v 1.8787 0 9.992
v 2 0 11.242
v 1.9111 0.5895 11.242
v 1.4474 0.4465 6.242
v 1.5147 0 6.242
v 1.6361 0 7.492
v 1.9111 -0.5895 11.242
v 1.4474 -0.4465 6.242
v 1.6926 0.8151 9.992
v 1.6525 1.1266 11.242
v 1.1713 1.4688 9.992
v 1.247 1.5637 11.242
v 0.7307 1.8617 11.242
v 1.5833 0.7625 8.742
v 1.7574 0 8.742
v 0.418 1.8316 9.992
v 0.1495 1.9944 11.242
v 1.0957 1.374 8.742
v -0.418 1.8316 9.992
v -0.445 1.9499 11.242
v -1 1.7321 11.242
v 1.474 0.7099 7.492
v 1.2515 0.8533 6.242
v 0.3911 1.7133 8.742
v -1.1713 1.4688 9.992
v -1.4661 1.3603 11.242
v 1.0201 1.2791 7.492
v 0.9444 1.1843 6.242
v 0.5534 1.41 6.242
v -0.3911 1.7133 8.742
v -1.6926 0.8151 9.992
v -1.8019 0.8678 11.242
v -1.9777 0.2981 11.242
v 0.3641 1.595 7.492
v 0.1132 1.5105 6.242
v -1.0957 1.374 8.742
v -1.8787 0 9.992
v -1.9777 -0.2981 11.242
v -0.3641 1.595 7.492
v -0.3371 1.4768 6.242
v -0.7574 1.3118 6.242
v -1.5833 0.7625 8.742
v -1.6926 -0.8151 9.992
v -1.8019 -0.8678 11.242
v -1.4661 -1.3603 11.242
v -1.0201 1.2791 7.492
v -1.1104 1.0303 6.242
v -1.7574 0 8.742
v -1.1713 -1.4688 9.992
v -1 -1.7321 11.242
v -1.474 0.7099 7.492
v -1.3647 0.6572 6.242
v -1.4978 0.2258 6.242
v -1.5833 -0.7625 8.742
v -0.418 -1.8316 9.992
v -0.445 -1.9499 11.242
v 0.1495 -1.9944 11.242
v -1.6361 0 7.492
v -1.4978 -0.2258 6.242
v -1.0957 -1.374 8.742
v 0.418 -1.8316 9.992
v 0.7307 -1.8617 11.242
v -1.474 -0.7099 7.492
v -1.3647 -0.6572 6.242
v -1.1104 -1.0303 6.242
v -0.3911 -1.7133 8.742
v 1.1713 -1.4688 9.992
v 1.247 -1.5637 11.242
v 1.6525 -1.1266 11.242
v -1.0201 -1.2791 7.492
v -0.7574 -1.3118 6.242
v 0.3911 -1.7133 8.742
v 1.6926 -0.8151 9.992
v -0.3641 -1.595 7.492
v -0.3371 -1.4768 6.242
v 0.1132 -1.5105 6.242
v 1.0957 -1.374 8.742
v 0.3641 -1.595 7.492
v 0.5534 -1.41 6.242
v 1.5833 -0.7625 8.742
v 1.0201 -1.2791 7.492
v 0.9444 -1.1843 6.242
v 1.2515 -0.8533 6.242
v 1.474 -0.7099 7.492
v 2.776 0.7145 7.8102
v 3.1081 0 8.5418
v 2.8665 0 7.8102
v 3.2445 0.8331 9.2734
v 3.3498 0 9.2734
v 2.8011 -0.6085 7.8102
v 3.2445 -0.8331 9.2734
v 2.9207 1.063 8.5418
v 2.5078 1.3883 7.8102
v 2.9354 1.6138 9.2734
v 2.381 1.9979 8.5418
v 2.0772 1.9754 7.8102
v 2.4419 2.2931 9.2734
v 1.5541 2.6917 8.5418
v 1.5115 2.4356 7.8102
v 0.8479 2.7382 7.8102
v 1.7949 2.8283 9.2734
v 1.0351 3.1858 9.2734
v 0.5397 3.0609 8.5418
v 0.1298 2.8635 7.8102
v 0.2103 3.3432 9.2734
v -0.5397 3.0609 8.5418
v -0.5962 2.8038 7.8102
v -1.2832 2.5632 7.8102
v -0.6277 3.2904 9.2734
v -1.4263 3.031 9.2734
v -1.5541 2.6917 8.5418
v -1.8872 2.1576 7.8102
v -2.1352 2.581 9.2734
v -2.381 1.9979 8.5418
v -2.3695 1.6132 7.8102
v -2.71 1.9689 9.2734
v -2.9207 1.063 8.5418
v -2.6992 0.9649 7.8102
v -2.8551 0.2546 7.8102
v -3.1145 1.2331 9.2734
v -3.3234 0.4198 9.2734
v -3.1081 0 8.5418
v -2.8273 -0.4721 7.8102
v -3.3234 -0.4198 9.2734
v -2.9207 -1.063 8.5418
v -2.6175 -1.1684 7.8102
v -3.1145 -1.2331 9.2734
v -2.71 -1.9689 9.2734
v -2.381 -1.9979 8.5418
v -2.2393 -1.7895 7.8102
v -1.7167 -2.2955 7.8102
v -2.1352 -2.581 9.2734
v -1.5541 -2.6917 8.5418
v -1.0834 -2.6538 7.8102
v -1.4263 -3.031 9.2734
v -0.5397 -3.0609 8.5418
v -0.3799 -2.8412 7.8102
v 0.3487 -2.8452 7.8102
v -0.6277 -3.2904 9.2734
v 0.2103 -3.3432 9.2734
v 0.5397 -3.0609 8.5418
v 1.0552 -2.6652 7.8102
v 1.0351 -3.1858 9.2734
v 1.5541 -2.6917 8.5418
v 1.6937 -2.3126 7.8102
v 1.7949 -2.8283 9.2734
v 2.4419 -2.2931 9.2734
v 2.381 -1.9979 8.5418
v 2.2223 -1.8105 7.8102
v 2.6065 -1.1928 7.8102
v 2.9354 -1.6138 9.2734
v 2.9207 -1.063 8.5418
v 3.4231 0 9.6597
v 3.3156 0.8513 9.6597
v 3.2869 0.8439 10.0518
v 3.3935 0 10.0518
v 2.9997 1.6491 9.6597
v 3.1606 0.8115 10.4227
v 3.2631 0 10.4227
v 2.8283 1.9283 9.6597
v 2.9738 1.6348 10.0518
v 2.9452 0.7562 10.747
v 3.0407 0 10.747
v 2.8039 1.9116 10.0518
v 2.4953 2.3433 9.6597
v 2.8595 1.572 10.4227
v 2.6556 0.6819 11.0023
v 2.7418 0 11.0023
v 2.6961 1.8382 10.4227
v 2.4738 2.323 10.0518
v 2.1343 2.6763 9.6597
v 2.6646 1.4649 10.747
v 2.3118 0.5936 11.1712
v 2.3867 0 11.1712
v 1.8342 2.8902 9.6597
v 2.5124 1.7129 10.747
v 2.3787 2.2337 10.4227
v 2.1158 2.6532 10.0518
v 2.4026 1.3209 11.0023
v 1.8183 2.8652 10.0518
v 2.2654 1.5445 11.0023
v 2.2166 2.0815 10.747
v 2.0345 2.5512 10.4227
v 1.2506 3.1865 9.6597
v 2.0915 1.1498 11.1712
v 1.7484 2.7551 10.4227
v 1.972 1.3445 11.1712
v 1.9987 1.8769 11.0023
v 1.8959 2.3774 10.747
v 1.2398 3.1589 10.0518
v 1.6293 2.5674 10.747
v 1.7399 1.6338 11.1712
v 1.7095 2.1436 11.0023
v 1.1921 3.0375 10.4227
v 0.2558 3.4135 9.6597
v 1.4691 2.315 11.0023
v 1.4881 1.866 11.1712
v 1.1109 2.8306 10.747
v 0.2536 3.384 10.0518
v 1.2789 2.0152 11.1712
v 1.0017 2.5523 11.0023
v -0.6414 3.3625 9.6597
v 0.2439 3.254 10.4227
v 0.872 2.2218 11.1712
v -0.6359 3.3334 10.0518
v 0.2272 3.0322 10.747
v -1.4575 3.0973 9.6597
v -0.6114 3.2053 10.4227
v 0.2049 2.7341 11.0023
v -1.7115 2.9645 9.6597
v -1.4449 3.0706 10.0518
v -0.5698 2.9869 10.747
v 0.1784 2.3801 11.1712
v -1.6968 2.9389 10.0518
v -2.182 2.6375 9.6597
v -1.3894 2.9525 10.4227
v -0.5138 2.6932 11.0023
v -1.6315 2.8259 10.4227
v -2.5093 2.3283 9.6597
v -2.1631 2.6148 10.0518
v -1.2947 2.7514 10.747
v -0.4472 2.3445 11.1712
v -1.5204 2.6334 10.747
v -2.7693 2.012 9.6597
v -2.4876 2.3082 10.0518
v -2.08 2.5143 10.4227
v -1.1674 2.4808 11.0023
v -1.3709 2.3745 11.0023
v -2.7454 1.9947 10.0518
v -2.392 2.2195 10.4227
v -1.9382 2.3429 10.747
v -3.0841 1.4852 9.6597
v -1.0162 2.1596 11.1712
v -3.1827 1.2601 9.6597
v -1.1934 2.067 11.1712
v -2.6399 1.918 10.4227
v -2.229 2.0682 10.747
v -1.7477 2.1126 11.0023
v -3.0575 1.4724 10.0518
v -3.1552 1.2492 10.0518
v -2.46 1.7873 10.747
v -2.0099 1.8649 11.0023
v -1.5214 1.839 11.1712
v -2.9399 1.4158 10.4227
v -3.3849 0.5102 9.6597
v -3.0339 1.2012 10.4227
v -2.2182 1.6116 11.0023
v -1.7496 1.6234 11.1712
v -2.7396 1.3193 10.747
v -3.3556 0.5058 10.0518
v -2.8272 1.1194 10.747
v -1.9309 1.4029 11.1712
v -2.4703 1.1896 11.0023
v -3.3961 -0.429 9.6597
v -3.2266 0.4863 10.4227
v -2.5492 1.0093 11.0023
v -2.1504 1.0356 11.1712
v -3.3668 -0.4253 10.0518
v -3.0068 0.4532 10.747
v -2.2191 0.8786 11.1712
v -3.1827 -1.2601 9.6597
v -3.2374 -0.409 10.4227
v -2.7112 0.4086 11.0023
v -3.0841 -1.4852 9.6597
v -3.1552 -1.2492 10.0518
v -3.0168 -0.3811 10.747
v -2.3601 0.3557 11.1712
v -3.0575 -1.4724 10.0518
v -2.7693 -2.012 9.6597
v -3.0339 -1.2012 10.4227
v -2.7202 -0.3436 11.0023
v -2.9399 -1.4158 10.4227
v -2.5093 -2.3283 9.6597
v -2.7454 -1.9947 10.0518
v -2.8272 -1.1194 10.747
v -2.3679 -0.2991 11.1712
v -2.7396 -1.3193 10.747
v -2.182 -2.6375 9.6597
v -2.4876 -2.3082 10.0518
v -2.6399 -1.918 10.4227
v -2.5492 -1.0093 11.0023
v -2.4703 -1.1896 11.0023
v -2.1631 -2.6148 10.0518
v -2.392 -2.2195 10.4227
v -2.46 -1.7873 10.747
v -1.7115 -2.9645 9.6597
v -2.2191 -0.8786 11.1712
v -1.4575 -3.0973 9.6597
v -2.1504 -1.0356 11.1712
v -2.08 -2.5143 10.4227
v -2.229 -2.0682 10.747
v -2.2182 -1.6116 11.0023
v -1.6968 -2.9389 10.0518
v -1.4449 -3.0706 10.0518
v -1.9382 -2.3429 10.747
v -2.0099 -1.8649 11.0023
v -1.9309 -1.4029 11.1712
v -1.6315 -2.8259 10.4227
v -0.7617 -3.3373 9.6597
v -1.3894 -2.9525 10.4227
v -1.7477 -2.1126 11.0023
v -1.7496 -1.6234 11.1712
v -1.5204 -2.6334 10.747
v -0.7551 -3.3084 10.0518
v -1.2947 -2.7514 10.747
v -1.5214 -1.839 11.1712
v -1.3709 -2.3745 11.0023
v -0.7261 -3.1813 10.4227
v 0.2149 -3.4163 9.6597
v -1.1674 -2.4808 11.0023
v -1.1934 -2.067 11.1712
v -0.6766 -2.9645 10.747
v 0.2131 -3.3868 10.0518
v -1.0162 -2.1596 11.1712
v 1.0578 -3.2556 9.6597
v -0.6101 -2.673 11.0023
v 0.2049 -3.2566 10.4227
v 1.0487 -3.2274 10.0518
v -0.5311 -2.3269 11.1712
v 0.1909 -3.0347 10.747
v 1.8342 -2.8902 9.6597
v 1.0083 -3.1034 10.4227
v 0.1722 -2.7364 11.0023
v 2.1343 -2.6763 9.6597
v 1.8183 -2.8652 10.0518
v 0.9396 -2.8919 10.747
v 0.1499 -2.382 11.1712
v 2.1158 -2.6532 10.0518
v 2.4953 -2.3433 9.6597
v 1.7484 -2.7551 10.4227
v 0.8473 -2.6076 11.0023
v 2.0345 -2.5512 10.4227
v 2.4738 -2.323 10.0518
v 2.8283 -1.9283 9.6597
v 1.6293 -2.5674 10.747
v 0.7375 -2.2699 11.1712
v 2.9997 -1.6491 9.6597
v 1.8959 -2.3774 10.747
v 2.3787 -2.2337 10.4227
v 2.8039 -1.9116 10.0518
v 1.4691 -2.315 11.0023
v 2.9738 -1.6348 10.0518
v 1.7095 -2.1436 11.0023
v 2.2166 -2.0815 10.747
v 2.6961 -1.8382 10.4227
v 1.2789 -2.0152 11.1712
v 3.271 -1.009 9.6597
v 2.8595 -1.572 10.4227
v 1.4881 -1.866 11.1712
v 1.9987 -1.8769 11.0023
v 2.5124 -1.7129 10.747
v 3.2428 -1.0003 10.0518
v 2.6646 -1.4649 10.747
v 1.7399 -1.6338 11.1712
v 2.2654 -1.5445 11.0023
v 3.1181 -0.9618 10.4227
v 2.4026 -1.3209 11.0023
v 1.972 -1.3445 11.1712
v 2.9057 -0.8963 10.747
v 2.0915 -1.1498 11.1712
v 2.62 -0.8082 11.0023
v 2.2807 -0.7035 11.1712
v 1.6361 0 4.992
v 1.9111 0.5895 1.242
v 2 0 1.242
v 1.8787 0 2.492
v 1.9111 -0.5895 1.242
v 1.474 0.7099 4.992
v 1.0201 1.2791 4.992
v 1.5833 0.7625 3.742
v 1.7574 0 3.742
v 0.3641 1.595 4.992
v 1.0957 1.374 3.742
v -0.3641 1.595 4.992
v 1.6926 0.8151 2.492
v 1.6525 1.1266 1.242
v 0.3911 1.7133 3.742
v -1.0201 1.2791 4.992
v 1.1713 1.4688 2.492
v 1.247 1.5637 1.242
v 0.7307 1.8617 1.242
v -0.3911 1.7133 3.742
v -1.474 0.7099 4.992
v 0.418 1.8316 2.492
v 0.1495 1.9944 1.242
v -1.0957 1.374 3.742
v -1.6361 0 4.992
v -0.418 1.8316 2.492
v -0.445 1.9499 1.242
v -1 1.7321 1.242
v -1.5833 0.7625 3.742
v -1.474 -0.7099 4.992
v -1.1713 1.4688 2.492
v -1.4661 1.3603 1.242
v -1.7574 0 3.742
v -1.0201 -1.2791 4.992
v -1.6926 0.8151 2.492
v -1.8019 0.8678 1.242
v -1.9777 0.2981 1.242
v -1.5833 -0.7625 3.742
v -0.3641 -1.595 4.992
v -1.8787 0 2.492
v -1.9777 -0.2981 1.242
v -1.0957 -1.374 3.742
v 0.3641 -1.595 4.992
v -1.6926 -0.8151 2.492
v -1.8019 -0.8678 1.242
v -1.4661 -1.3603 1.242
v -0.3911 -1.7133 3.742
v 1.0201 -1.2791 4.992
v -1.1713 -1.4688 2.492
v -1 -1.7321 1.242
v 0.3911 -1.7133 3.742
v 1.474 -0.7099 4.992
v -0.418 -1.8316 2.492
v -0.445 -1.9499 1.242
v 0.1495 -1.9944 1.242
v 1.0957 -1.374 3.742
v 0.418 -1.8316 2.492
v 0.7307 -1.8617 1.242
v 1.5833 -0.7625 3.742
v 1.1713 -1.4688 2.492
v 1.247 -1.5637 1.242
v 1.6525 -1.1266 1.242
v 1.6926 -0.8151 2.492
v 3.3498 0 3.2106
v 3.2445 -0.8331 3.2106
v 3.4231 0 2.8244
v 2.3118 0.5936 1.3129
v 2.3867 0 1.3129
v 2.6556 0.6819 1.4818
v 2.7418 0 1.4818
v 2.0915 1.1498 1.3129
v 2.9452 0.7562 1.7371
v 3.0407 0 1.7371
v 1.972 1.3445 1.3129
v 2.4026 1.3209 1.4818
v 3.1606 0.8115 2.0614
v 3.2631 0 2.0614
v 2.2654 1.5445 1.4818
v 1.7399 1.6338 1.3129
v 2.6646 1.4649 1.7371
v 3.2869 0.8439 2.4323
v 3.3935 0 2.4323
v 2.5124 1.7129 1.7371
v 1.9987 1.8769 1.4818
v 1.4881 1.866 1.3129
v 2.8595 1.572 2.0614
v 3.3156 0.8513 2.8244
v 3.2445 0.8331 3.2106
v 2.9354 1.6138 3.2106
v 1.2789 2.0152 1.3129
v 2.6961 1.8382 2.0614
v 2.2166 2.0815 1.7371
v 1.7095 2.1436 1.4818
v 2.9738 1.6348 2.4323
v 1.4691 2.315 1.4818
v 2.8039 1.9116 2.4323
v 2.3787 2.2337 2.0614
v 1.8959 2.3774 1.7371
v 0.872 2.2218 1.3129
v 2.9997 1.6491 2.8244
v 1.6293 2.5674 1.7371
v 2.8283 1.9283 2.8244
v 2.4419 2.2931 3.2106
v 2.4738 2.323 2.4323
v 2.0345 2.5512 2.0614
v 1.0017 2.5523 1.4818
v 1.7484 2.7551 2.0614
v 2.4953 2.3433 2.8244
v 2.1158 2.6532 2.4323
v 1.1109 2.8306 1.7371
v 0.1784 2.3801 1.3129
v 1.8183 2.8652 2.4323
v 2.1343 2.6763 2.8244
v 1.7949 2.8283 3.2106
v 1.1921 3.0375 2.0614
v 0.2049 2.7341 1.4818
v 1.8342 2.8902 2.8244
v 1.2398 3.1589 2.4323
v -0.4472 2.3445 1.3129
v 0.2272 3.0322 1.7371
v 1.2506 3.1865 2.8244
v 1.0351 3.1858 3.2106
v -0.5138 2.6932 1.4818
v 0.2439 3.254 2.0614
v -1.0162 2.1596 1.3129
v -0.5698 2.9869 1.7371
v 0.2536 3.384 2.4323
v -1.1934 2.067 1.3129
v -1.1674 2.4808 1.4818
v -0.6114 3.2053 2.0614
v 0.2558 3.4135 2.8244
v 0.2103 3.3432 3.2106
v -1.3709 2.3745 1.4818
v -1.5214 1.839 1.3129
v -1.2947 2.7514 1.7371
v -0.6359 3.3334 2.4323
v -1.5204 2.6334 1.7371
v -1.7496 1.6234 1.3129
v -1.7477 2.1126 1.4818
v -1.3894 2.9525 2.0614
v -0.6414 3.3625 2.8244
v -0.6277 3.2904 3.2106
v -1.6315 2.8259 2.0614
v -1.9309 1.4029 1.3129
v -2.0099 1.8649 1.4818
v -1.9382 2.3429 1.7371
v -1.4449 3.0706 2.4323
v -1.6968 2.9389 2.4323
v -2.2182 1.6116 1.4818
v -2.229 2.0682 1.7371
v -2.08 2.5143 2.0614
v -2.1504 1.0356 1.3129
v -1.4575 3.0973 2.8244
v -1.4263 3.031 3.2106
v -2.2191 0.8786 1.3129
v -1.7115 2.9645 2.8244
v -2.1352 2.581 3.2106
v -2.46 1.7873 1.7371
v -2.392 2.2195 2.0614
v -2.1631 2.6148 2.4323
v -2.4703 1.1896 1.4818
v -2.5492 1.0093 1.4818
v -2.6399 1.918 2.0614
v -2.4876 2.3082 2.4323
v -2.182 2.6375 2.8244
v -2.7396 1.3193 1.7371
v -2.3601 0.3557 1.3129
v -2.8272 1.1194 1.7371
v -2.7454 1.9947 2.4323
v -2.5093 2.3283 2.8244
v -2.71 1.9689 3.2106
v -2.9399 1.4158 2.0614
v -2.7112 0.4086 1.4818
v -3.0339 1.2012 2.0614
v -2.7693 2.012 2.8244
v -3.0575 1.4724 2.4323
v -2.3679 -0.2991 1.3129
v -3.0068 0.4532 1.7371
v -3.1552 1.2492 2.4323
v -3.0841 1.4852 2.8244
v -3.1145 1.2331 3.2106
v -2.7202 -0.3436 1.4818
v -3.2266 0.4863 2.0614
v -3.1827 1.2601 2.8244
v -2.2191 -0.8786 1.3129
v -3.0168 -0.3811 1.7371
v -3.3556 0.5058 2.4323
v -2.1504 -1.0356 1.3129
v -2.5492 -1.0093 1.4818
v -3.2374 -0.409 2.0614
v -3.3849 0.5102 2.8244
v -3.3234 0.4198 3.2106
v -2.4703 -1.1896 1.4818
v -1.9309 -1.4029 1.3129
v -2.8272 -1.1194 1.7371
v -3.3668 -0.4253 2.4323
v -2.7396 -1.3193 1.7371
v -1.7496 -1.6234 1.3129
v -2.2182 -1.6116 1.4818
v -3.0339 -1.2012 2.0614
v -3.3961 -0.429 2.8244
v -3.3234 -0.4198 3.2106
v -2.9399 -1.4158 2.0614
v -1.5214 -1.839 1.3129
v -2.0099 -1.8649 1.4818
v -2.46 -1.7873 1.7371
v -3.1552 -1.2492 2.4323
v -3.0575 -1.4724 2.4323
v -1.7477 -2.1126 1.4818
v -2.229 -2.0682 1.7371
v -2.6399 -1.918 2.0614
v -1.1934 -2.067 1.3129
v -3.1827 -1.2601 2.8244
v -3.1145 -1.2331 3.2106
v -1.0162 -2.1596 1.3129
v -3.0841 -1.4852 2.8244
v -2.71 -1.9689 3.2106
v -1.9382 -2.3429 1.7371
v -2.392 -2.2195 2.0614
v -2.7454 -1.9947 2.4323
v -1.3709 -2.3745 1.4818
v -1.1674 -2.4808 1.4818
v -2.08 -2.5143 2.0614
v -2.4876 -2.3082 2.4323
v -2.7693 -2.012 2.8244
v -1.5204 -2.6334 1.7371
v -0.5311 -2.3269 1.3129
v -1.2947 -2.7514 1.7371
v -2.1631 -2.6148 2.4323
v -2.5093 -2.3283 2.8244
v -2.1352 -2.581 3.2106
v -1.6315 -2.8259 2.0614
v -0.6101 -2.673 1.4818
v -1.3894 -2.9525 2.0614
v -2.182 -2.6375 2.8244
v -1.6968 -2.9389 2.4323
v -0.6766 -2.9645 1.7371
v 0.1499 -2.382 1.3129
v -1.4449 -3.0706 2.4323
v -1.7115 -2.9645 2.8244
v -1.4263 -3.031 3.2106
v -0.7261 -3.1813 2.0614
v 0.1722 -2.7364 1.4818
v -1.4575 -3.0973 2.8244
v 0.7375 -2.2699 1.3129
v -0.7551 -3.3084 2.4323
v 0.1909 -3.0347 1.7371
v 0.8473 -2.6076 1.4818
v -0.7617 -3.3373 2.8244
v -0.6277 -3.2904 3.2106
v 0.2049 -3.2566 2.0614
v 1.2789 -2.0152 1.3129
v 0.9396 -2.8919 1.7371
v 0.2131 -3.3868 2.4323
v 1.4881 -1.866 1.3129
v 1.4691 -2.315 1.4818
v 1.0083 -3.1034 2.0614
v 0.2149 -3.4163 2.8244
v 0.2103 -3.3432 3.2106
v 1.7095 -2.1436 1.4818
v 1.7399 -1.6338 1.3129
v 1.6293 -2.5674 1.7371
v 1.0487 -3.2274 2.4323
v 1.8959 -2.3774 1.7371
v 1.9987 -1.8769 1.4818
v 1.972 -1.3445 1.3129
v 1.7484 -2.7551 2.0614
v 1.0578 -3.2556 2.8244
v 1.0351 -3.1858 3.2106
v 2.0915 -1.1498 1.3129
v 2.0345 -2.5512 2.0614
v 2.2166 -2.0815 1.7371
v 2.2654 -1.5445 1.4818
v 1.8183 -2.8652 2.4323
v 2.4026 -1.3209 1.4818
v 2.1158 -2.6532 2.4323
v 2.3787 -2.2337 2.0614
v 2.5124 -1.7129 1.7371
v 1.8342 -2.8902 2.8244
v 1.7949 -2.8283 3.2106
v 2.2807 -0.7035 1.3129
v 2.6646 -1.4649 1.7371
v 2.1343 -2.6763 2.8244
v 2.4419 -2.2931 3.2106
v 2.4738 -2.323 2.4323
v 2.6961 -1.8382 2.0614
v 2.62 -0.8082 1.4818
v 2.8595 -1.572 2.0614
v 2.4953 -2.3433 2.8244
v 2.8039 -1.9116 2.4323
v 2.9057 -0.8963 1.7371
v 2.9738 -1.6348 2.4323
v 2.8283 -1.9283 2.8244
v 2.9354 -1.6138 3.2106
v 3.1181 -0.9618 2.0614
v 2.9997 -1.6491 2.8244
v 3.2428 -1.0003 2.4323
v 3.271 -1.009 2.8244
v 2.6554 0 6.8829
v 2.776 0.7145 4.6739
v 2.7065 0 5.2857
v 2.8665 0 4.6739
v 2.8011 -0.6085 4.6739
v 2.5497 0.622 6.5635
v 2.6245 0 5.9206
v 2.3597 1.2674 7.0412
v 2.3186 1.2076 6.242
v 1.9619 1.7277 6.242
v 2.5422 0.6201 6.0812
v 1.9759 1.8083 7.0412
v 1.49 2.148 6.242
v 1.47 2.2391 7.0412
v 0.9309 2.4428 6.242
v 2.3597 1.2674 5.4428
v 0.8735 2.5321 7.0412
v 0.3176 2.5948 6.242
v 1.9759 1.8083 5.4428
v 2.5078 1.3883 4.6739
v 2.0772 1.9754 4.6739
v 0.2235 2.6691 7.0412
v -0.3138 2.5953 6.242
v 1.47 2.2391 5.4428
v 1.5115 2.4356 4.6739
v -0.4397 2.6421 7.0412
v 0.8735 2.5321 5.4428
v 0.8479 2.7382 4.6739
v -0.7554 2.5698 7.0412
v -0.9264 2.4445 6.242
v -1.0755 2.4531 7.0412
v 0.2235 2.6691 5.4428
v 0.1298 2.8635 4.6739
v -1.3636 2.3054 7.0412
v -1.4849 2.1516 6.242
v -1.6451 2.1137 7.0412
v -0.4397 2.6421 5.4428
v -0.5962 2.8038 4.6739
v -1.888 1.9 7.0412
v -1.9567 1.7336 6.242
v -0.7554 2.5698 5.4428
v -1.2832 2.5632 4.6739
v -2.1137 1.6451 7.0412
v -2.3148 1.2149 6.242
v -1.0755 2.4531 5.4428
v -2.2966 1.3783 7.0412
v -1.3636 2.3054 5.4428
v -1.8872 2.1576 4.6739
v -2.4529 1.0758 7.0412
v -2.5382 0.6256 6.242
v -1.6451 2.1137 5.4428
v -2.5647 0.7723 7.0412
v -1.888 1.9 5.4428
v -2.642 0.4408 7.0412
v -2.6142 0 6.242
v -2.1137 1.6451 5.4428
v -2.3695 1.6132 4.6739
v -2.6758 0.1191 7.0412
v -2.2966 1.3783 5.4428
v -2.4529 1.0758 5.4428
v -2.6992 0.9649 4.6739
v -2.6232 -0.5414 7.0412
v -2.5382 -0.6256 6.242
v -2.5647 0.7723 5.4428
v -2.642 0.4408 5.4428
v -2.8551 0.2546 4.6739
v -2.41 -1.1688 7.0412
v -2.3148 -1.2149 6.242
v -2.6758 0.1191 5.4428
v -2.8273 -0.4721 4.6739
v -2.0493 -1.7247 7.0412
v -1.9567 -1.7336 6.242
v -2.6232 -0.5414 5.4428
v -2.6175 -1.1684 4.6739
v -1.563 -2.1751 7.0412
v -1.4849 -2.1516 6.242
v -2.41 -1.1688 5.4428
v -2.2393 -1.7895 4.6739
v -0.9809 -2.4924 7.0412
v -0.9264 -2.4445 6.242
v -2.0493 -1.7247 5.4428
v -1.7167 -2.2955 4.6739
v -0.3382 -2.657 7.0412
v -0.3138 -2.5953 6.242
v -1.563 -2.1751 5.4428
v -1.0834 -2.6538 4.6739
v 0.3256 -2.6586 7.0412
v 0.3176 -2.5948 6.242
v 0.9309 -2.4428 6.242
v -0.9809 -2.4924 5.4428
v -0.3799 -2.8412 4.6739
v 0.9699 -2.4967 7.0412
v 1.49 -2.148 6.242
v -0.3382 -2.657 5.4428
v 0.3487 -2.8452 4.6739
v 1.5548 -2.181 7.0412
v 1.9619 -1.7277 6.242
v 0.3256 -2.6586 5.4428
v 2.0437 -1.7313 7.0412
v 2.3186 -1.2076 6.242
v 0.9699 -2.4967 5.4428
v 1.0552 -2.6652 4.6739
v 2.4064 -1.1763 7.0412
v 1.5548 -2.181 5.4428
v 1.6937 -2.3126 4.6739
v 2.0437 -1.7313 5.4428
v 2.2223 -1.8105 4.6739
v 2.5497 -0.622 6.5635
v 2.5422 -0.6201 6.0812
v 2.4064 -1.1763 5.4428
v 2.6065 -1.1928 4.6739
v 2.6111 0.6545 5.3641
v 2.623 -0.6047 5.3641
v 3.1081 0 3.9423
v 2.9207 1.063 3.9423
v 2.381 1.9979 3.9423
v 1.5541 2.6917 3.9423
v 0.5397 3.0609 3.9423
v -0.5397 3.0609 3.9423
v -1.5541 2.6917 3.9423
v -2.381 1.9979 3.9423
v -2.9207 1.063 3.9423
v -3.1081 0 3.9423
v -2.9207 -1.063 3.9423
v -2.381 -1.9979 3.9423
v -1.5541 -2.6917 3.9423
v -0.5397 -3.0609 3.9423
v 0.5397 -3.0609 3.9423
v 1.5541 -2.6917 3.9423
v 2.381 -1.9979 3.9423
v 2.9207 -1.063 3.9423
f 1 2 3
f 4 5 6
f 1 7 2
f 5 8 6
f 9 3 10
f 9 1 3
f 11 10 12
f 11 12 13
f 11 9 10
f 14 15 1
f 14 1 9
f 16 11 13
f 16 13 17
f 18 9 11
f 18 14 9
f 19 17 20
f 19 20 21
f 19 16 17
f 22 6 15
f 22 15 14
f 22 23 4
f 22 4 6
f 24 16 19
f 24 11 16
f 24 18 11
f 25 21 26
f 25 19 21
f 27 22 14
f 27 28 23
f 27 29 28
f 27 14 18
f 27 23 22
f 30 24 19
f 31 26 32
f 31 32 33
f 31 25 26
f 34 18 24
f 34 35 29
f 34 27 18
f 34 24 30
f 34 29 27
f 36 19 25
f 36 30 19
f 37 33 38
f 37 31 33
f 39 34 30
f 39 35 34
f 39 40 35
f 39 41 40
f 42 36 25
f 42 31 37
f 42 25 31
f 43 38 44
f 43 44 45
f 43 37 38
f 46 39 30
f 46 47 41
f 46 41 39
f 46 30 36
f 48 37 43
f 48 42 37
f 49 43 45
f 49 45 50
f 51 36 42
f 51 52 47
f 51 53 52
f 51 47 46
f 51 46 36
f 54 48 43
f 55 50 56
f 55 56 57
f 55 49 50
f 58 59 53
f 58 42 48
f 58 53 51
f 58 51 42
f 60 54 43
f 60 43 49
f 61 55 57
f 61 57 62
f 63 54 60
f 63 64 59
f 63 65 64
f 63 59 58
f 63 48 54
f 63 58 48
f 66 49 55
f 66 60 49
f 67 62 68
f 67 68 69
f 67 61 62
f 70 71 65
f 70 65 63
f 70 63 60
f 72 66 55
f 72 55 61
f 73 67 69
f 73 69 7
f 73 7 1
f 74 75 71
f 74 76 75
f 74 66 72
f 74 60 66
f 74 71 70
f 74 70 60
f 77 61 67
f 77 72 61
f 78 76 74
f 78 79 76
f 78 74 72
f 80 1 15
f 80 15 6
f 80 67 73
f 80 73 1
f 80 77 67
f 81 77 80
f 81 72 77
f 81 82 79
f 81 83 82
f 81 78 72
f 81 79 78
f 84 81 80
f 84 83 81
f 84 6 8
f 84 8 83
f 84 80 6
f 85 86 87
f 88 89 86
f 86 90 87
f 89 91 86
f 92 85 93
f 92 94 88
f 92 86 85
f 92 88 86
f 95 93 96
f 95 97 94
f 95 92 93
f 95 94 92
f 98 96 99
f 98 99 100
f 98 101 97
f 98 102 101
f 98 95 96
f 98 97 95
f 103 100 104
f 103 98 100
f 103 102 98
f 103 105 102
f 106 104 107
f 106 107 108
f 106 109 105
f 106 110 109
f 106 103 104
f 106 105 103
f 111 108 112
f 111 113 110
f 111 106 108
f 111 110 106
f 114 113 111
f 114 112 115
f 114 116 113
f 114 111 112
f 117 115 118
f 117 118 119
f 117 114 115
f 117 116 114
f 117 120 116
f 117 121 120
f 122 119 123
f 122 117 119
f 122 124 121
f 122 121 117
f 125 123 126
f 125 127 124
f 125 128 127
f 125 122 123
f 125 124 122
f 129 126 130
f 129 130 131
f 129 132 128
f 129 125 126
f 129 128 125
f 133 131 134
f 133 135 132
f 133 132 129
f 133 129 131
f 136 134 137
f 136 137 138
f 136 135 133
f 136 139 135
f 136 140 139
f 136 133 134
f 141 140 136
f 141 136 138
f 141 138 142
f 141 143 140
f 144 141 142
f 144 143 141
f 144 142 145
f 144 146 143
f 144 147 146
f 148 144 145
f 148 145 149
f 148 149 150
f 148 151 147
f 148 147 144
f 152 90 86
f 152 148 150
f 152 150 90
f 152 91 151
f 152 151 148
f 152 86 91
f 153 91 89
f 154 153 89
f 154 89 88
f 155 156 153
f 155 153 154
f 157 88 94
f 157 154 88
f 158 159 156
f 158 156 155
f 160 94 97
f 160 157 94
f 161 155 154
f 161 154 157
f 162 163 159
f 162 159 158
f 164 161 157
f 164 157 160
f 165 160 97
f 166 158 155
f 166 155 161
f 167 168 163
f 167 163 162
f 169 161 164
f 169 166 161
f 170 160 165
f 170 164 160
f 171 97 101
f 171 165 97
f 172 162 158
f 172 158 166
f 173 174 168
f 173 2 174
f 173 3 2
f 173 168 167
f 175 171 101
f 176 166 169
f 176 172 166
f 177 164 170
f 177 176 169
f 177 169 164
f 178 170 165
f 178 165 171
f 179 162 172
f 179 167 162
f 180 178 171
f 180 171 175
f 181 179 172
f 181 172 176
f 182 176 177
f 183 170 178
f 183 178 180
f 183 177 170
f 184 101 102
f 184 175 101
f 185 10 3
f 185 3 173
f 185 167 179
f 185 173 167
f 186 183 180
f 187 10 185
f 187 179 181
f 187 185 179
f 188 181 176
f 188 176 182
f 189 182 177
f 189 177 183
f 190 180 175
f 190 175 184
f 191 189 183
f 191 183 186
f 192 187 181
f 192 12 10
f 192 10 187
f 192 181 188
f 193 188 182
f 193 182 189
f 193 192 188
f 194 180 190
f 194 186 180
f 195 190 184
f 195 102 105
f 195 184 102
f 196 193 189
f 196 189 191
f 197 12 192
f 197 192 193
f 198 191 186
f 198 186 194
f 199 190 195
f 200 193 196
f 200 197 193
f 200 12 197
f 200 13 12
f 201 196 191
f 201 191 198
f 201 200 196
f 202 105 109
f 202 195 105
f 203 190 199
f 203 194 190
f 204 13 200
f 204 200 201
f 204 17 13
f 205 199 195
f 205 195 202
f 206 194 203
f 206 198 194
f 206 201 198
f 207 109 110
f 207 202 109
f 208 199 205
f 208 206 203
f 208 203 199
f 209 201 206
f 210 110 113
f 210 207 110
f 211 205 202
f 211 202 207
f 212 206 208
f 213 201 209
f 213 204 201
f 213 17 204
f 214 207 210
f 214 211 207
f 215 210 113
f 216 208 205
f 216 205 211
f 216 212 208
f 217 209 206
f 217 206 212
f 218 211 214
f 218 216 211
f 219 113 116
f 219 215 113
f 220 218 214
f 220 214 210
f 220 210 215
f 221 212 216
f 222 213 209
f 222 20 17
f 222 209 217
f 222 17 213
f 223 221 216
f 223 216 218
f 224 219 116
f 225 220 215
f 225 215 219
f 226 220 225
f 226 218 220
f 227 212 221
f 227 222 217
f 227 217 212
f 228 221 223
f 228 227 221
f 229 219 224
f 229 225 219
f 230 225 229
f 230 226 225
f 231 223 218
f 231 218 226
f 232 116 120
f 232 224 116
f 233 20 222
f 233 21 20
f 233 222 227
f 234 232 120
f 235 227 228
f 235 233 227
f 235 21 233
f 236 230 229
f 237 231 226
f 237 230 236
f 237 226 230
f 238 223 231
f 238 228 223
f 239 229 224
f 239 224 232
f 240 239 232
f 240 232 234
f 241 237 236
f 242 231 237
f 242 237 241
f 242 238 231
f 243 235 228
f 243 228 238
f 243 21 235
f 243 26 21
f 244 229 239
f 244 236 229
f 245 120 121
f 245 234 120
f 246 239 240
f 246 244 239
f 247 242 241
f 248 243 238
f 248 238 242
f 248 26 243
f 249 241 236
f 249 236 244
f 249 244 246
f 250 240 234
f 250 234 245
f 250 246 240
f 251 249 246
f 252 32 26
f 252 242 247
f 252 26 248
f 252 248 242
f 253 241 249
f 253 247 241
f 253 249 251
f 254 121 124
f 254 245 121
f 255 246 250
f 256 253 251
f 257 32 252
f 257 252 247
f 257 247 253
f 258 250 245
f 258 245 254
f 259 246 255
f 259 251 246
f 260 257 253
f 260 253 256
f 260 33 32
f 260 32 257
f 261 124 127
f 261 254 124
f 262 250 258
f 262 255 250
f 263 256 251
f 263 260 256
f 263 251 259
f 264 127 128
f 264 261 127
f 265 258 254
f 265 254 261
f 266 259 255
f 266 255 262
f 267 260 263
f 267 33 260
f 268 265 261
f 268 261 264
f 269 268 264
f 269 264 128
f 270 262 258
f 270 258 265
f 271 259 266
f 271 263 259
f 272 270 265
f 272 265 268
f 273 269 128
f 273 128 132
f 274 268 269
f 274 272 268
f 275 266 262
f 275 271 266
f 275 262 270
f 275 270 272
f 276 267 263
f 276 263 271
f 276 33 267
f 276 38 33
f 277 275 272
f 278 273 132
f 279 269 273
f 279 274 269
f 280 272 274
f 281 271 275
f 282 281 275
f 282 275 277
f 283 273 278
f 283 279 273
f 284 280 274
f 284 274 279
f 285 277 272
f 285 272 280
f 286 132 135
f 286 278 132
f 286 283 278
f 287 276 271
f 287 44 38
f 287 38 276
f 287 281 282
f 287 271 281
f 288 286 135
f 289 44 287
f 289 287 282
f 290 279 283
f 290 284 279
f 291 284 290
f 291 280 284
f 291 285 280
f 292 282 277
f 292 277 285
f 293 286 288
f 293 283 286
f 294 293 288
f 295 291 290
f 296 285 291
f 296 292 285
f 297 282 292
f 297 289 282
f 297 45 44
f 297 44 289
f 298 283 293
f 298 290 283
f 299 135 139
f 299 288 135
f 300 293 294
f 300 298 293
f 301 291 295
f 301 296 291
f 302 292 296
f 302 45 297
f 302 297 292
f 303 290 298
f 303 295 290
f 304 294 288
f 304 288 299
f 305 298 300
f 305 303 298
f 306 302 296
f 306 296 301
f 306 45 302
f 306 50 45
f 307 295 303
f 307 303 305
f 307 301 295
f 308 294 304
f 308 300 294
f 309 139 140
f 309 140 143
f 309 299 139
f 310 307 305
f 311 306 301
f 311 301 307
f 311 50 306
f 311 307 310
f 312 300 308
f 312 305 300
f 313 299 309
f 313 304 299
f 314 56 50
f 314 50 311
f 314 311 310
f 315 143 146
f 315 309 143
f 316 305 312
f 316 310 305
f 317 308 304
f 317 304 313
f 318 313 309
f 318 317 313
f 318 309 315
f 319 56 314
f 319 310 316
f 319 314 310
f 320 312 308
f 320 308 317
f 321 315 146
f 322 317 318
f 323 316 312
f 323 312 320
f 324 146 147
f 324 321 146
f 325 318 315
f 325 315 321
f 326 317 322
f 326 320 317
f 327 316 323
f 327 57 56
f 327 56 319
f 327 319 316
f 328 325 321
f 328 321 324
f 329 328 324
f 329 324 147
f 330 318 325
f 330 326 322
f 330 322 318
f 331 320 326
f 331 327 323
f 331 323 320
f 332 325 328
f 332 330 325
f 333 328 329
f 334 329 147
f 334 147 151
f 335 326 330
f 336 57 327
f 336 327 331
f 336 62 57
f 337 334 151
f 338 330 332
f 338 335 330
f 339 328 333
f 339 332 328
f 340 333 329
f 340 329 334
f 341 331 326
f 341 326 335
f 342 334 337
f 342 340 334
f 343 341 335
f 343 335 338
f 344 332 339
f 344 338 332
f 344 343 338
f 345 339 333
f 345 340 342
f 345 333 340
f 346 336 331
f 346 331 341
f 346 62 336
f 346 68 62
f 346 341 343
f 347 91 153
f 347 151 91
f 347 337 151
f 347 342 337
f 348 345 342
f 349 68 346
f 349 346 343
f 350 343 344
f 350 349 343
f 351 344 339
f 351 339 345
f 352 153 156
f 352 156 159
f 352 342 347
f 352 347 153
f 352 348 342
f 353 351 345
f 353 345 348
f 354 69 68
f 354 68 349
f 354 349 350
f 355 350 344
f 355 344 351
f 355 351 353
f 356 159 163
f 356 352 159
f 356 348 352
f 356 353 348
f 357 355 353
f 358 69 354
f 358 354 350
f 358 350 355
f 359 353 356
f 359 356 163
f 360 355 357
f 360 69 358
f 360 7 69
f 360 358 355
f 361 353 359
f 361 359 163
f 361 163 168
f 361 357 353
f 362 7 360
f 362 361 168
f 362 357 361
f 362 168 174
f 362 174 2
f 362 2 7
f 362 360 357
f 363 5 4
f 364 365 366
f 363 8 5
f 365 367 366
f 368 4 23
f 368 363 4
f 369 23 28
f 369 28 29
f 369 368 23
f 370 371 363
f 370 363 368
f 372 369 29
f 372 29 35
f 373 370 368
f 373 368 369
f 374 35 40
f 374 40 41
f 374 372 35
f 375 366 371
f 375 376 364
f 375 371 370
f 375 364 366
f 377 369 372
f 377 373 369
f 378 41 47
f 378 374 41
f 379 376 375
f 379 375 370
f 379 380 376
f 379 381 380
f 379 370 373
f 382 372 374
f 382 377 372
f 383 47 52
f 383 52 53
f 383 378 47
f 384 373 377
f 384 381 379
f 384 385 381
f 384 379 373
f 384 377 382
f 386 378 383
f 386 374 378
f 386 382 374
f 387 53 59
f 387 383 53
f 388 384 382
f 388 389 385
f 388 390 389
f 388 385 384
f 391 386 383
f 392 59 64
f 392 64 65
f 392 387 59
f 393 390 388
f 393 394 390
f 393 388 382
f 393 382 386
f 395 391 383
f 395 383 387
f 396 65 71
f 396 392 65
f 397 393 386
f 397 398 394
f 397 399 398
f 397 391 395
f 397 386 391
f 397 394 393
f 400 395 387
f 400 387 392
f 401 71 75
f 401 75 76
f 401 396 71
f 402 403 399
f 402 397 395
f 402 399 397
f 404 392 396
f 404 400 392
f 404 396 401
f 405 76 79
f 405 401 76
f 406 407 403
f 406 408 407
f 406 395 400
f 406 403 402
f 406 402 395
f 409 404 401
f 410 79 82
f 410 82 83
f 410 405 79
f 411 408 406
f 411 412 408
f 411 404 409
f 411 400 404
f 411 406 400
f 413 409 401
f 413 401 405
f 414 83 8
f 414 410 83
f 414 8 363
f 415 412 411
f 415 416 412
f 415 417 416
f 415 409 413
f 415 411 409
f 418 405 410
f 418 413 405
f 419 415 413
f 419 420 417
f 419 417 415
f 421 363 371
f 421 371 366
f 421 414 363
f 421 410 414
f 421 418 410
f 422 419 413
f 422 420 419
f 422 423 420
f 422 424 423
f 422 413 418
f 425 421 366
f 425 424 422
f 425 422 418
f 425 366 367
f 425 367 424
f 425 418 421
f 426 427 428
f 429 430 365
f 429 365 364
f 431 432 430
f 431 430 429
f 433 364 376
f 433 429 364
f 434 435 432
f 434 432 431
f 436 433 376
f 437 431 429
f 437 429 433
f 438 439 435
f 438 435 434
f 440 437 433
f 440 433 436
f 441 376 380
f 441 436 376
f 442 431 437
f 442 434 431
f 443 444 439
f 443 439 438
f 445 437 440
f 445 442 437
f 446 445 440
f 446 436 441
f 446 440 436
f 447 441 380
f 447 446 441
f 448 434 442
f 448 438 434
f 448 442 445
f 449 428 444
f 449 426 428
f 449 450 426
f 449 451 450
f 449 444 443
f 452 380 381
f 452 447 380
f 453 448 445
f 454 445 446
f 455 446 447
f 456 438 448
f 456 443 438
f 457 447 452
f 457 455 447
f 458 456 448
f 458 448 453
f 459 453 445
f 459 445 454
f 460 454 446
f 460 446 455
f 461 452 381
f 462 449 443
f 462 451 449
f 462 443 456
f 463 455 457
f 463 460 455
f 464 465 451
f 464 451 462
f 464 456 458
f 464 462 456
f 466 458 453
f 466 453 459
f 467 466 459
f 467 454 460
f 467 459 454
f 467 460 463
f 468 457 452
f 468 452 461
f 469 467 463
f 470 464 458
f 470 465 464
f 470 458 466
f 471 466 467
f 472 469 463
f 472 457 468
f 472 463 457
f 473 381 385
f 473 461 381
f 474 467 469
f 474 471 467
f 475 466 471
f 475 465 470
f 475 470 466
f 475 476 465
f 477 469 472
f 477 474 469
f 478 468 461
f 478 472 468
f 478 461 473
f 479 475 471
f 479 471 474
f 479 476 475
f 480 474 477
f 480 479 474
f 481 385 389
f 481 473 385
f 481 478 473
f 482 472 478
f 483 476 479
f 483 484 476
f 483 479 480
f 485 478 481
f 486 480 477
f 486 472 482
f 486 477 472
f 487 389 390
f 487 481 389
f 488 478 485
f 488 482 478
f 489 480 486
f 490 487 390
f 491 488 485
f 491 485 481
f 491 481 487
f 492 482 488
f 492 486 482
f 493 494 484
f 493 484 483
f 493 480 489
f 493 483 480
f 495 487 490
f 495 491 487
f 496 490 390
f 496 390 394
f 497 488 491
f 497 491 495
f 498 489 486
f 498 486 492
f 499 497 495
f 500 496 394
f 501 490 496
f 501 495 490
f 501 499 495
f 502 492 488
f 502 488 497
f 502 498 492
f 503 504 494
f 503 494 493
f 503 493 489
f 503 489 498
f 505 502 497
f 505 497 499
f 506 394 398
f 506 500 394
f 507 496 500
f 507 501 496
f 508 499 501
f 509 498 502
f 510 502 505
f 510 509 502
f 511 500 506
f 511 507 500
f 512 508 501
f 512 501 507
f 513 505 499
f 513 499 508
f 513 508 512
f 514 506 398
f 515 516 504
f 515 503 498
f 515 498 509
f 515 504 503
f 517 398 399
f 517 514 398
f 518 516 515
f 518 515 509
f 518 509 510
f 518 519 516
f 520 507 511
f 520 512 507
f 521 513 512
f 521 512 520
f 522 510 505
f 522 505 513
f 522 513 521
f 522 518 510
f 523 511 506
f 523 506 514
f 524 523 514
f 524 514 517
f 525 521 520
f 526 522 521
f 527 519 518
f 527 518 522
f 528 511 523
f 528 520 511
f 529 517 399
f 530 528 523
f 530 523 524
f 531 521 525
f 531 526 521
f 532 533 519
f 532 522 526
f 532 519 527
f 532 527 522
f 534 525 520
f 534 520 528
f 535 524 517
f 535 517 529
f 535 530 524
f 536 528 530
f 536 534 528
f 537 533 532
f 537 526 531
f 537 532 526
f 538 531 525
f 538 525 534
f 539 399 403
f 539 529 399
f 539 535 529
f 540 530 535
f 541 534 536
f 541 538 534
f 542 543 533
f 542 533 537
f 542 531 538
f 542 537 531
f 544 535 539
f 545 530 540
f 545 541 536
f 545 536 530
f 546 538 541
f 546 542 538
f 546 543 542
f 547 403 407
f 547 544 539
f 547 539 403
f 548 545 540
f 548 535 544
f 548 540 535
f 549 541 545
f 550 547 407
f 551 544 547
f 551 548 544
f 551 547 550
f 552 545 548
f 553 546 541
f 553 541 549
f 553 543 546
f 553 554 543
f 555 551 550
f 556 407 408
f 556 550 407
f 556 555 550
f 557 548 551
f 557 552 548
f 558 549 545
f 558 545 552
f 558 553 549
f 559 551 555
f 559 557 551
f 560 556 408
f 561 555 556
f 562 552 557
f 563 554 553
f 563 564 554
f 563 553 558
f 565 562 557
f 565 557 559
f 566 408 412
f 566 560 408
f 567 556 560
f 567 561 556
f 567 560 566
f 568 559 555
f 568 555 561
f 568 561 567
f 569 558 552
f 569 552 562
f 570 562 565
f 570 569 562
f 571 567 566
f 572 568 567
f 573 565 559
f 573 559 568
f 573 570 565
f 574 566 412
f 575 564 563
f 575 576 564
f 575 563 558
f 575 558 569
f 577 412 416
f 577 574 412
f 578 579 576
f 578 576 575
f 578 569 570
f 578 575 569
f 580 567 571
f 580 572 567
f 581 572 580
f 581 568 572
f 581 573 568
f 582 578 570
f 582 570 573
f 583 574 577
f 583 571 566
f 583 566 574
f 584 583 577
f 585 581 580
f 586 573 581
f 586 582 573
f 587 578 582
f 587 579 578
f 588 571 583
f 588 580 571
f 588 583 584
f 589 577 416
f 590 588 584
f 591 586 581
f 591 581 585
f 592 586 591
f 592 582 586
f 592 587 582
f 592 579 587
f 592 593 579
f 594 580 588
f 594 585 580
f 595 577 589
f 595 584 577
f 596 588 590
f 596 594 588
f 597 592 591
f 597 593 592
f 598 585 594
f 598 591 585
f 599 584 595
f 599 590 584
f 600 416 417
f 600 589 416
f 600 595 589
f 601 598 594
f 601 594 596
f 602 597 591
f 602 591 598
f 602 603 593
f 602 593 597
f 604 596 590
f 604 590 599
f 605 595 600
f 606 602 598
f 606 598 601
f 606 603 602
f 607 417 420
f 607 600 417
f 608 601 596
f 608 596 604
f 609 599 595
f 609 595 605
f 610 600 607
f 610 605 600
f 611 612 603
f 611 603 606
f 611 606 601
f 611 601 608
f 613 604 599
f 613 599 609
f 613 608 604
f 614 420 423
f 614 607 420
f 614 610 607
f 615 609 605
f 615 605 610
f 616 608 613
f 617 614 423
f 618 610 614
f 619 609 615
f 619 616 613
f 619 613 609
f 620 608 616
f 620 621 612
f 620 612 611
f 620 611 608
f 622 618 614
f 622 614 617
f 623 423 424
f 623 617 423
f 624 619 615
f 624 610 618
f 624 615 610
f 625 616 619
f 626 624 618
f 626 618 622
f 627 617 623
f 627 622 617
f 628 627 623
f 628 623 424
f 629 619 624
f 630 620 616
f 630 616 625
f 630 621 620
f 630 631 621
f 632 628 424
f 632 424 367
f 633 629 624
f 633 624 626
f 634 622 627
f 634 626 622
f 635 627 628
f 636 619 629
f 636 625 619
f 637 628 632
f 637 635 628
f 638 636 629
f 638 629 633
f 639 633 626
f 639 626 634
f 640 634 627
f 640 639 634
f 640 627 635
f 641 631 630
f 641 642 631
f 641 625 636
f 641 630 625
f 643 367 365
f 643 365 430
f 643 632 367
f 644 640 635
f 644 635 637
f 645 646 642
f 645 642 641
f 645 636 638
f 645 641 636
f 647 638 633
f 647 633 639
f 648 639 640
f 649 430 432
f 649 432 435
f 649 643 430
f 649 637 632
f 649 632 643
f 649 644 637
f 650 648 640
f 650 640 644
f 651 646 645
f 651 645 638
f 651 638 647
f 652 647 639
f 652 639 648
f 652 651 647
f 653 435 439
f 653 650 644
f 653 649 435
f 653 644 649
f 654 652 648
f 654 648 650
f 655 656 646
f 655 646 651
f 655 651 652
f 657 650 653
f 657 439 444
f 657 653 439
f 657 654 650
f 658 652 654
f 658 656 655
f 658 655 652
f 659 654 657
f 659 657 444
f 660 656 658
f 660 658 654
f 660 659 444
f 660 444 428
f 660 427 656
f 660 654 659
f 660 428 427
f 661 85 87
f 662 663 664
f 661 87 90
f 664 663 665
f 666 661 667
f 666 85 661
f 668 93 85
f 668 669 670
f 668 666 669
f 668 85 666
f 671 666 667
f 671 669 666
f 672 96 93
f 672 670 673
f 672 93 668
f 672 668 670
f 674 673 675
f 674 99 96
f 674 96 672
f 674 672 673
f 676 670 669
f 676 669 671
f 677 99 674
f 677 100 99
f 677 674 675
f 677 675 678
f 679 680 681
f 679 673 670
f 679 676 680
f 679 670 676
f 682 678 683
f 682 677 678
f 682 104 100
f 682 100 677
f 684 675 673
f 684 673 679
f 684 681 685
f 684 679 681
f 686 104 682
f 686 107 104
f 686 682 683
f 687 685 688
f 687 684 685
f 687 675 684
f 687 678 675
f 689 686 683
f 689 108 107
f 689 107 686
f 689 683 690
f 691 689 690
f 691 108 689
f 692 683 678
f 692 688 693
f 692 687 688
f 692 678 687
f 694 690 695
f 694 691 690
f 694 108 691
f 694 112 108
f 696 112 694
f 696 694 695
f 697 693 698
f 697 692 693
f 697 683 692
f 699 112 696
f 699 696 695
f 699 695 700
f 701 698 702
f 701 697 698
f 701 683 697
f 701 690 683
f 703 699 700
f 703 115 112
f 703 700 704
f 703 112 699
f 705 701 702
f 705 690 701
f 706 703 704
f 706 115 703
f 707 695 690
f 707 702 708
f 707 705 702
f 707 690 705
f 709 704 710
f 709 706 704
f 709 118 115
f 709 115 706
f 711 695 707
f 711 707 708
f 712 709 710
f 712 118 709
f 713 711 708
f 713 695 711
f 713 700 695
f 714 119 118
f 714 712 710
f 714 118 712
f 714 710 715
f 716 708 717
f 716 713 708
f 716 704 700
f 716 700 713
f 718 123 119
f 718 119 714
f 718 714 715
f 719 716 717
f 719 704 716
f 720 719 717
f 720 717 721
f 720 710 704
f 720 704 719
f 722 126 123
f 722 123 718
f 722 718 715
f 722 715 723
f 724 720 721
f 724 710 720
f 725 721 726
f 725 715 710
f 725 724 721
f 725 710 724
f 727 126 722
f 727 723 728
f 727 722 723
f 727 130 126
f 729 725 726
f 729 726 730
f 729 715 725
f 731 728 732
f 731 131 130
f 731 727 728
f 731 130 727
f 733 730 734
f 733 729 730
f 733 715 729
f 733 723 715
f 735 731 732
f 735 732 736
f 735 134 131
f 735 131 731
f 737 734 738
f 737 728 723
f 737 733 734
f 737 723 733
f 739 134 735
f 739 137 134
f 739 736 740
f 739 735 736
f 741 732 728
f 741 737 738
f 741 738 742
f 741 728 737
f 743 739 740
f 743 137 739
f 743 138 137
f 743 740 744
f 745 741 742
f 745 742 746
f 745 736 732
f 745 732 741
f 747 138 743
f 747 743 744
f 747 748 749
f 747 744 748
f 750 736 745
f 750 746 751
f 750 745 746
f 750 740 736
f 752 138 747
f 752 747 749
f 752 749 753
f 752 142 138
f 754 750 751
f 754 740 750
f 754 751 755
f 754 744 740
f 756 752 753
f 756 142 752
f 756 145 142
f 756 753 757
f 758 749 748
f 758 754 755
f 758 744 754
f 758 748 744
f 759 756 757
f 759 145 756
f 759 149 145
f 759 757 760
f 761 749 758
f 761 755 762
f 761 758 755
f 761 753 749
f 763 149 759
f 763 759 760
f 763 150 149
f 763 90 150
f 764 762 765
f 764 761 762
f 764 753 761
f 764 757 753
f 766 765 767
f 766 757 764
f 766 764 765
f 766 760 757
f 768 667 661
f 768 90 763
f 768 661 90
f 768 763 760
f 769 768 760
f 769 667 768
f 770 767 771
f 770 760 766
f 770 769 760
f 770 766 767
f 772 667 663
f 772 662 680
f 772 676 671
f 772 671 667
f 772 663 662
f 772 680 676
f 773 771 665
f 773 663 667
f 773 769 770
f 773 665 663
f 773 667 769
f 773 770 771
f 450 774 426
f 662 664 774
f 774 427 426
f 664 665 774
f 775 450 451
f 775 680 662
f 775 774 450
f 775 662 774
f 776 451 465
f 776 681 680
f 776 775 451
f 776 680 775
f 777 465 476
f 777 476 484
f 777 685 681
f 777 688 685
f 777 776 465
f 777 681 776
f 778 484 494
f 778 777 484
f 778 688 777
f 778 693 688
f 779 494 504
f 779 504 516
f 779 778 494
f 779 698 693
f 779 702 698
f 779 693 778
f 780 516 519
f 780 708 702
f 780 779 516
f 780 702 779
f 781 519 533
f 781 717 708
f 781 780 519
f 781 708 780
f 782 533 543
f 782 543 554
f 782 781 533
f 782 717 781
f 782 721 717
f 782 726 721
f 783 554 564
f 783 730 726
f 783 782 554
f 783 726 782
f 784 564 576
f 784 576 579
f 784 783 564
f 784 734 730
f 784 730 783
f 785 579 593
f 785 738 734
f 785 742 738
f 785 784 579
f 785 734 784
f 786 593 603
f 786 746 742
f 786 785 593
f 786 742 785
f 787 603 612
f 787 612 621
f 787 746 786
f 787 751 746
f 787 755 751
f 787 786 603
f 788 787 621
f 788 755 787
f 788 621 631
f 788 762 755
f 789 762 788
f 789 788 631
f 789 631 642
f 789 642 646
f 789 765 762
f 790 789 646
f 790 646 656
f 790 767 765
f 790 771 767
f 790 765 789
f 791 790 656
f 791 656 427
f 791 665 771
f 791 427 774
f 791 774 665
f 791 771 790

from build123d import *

# Parameters (mm, degrees)
F3_R = 5


# Not quite as in the source:
# - a fillet or chamfer that OpenCascade refuses, or shapes differently, is made with other operations: its cross-section is extruded or revolved along the edge and cut away or added


with BuildPart() as f1:
    # F0 (on Front) → F1 (revolve)
    with BuildSketch(Plane.XZ):
        Polygon((4, 11.2420413941), (2, 11.2420413941), (1.5147400554, 6.2420413941), (2, 1.2420413941), (4, 1.2420413941), (2.3485091515, 6.2420413941), align=None)
    revolve(axis=Axis((0, 0, 6.2420413941), (0, 0, 1)))

    # F2: fillet of radius 1.5 on 2 edges, made by hand

    # F2_s1 → F2_t2 (revolve, cut)
    with BuildSketch(Plane.XZ):
        with BuildLine():
            ThreePointArc((3.3497763701, 9.2734454721), (3.162587688, 10.592136722), (2, 11.2420413941))
            Line((2, 11.2420413941), (4, 11.2420413941))
            Line((4, 11.2420413941), (3.3497763701, 9.2734454721))
        make_face()
    revolve(axis=Axis((0, 0, 11.2420413941), (0, 0, 1)), mode=Mode.SUBTRACT)

    # F2_s3 → F2_t4 (revolve, cut)
    with BuildSketch(Plane.XZ):
        with BuildLine():
            ThreePointArc((2, 1.2420413941), (3.162587688, 1.8919460662), (3.3497763701, 3.2106373161))
            Line((3.3497763701, 3.2106373161), (4, 1.2420413941))
            Line((4, 1.2420413941), (2, 1.2420413941))
        make_face()
    revolve(axis=Axis((0, 0, 1.2420413941), (0, 0, 1)), mode=Mode.SUBTRACT)

    # F3
    f3_edges = [f1.edges().sort_by_distance(p)[0] for p in [
        (-2.348509, 0, 6.242041),
    ]]
    fillet(f3_edges, radius=F3_R)


solid = f1.part
